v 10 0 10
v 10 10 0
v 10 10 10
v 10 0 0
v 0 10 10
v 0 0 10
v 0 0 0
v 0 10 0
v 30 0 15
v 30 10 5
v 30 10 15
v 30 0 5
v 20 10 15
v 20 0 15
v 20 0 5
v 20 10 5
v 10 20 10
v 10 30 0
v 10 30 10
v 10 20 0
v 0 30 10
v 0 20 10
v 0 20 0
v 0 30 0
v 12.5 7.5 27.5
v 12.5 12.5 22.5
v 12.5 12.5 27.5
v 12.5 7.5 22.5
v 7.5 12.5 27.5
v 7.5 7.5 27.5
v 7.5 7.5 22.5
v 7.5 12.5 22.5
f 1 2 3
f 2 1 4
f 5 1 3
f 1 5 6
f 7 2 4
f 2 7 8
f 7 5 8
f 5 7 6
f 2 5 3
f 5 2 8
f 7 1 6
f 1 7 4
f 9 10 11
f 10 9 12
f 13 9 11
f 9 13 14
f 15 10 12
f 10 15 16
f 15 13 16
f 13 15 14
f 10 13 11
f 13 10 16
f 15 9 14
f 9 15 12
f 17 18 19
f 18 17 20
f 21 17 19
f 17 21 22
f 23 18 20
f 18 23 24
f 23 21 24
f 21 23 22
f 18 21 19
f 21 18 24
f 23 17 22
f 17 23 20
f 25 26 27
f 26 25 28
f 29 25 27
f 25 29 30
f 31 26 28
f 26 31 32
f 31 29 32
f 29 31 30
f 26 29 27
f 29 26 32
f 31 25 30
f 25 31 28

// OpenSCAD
use <../nscad-lib.scad>

color("lightgray") cube(10);
color("orange") move(20, 0, 5) cube(10);    // = translate([20,0,5])
color("orange") m(0, 20) cube(10);           // Kurzform
color("orange") moveR(1, 1, 3) cube(5);     // Rastereinheiten (7.5 mm)
